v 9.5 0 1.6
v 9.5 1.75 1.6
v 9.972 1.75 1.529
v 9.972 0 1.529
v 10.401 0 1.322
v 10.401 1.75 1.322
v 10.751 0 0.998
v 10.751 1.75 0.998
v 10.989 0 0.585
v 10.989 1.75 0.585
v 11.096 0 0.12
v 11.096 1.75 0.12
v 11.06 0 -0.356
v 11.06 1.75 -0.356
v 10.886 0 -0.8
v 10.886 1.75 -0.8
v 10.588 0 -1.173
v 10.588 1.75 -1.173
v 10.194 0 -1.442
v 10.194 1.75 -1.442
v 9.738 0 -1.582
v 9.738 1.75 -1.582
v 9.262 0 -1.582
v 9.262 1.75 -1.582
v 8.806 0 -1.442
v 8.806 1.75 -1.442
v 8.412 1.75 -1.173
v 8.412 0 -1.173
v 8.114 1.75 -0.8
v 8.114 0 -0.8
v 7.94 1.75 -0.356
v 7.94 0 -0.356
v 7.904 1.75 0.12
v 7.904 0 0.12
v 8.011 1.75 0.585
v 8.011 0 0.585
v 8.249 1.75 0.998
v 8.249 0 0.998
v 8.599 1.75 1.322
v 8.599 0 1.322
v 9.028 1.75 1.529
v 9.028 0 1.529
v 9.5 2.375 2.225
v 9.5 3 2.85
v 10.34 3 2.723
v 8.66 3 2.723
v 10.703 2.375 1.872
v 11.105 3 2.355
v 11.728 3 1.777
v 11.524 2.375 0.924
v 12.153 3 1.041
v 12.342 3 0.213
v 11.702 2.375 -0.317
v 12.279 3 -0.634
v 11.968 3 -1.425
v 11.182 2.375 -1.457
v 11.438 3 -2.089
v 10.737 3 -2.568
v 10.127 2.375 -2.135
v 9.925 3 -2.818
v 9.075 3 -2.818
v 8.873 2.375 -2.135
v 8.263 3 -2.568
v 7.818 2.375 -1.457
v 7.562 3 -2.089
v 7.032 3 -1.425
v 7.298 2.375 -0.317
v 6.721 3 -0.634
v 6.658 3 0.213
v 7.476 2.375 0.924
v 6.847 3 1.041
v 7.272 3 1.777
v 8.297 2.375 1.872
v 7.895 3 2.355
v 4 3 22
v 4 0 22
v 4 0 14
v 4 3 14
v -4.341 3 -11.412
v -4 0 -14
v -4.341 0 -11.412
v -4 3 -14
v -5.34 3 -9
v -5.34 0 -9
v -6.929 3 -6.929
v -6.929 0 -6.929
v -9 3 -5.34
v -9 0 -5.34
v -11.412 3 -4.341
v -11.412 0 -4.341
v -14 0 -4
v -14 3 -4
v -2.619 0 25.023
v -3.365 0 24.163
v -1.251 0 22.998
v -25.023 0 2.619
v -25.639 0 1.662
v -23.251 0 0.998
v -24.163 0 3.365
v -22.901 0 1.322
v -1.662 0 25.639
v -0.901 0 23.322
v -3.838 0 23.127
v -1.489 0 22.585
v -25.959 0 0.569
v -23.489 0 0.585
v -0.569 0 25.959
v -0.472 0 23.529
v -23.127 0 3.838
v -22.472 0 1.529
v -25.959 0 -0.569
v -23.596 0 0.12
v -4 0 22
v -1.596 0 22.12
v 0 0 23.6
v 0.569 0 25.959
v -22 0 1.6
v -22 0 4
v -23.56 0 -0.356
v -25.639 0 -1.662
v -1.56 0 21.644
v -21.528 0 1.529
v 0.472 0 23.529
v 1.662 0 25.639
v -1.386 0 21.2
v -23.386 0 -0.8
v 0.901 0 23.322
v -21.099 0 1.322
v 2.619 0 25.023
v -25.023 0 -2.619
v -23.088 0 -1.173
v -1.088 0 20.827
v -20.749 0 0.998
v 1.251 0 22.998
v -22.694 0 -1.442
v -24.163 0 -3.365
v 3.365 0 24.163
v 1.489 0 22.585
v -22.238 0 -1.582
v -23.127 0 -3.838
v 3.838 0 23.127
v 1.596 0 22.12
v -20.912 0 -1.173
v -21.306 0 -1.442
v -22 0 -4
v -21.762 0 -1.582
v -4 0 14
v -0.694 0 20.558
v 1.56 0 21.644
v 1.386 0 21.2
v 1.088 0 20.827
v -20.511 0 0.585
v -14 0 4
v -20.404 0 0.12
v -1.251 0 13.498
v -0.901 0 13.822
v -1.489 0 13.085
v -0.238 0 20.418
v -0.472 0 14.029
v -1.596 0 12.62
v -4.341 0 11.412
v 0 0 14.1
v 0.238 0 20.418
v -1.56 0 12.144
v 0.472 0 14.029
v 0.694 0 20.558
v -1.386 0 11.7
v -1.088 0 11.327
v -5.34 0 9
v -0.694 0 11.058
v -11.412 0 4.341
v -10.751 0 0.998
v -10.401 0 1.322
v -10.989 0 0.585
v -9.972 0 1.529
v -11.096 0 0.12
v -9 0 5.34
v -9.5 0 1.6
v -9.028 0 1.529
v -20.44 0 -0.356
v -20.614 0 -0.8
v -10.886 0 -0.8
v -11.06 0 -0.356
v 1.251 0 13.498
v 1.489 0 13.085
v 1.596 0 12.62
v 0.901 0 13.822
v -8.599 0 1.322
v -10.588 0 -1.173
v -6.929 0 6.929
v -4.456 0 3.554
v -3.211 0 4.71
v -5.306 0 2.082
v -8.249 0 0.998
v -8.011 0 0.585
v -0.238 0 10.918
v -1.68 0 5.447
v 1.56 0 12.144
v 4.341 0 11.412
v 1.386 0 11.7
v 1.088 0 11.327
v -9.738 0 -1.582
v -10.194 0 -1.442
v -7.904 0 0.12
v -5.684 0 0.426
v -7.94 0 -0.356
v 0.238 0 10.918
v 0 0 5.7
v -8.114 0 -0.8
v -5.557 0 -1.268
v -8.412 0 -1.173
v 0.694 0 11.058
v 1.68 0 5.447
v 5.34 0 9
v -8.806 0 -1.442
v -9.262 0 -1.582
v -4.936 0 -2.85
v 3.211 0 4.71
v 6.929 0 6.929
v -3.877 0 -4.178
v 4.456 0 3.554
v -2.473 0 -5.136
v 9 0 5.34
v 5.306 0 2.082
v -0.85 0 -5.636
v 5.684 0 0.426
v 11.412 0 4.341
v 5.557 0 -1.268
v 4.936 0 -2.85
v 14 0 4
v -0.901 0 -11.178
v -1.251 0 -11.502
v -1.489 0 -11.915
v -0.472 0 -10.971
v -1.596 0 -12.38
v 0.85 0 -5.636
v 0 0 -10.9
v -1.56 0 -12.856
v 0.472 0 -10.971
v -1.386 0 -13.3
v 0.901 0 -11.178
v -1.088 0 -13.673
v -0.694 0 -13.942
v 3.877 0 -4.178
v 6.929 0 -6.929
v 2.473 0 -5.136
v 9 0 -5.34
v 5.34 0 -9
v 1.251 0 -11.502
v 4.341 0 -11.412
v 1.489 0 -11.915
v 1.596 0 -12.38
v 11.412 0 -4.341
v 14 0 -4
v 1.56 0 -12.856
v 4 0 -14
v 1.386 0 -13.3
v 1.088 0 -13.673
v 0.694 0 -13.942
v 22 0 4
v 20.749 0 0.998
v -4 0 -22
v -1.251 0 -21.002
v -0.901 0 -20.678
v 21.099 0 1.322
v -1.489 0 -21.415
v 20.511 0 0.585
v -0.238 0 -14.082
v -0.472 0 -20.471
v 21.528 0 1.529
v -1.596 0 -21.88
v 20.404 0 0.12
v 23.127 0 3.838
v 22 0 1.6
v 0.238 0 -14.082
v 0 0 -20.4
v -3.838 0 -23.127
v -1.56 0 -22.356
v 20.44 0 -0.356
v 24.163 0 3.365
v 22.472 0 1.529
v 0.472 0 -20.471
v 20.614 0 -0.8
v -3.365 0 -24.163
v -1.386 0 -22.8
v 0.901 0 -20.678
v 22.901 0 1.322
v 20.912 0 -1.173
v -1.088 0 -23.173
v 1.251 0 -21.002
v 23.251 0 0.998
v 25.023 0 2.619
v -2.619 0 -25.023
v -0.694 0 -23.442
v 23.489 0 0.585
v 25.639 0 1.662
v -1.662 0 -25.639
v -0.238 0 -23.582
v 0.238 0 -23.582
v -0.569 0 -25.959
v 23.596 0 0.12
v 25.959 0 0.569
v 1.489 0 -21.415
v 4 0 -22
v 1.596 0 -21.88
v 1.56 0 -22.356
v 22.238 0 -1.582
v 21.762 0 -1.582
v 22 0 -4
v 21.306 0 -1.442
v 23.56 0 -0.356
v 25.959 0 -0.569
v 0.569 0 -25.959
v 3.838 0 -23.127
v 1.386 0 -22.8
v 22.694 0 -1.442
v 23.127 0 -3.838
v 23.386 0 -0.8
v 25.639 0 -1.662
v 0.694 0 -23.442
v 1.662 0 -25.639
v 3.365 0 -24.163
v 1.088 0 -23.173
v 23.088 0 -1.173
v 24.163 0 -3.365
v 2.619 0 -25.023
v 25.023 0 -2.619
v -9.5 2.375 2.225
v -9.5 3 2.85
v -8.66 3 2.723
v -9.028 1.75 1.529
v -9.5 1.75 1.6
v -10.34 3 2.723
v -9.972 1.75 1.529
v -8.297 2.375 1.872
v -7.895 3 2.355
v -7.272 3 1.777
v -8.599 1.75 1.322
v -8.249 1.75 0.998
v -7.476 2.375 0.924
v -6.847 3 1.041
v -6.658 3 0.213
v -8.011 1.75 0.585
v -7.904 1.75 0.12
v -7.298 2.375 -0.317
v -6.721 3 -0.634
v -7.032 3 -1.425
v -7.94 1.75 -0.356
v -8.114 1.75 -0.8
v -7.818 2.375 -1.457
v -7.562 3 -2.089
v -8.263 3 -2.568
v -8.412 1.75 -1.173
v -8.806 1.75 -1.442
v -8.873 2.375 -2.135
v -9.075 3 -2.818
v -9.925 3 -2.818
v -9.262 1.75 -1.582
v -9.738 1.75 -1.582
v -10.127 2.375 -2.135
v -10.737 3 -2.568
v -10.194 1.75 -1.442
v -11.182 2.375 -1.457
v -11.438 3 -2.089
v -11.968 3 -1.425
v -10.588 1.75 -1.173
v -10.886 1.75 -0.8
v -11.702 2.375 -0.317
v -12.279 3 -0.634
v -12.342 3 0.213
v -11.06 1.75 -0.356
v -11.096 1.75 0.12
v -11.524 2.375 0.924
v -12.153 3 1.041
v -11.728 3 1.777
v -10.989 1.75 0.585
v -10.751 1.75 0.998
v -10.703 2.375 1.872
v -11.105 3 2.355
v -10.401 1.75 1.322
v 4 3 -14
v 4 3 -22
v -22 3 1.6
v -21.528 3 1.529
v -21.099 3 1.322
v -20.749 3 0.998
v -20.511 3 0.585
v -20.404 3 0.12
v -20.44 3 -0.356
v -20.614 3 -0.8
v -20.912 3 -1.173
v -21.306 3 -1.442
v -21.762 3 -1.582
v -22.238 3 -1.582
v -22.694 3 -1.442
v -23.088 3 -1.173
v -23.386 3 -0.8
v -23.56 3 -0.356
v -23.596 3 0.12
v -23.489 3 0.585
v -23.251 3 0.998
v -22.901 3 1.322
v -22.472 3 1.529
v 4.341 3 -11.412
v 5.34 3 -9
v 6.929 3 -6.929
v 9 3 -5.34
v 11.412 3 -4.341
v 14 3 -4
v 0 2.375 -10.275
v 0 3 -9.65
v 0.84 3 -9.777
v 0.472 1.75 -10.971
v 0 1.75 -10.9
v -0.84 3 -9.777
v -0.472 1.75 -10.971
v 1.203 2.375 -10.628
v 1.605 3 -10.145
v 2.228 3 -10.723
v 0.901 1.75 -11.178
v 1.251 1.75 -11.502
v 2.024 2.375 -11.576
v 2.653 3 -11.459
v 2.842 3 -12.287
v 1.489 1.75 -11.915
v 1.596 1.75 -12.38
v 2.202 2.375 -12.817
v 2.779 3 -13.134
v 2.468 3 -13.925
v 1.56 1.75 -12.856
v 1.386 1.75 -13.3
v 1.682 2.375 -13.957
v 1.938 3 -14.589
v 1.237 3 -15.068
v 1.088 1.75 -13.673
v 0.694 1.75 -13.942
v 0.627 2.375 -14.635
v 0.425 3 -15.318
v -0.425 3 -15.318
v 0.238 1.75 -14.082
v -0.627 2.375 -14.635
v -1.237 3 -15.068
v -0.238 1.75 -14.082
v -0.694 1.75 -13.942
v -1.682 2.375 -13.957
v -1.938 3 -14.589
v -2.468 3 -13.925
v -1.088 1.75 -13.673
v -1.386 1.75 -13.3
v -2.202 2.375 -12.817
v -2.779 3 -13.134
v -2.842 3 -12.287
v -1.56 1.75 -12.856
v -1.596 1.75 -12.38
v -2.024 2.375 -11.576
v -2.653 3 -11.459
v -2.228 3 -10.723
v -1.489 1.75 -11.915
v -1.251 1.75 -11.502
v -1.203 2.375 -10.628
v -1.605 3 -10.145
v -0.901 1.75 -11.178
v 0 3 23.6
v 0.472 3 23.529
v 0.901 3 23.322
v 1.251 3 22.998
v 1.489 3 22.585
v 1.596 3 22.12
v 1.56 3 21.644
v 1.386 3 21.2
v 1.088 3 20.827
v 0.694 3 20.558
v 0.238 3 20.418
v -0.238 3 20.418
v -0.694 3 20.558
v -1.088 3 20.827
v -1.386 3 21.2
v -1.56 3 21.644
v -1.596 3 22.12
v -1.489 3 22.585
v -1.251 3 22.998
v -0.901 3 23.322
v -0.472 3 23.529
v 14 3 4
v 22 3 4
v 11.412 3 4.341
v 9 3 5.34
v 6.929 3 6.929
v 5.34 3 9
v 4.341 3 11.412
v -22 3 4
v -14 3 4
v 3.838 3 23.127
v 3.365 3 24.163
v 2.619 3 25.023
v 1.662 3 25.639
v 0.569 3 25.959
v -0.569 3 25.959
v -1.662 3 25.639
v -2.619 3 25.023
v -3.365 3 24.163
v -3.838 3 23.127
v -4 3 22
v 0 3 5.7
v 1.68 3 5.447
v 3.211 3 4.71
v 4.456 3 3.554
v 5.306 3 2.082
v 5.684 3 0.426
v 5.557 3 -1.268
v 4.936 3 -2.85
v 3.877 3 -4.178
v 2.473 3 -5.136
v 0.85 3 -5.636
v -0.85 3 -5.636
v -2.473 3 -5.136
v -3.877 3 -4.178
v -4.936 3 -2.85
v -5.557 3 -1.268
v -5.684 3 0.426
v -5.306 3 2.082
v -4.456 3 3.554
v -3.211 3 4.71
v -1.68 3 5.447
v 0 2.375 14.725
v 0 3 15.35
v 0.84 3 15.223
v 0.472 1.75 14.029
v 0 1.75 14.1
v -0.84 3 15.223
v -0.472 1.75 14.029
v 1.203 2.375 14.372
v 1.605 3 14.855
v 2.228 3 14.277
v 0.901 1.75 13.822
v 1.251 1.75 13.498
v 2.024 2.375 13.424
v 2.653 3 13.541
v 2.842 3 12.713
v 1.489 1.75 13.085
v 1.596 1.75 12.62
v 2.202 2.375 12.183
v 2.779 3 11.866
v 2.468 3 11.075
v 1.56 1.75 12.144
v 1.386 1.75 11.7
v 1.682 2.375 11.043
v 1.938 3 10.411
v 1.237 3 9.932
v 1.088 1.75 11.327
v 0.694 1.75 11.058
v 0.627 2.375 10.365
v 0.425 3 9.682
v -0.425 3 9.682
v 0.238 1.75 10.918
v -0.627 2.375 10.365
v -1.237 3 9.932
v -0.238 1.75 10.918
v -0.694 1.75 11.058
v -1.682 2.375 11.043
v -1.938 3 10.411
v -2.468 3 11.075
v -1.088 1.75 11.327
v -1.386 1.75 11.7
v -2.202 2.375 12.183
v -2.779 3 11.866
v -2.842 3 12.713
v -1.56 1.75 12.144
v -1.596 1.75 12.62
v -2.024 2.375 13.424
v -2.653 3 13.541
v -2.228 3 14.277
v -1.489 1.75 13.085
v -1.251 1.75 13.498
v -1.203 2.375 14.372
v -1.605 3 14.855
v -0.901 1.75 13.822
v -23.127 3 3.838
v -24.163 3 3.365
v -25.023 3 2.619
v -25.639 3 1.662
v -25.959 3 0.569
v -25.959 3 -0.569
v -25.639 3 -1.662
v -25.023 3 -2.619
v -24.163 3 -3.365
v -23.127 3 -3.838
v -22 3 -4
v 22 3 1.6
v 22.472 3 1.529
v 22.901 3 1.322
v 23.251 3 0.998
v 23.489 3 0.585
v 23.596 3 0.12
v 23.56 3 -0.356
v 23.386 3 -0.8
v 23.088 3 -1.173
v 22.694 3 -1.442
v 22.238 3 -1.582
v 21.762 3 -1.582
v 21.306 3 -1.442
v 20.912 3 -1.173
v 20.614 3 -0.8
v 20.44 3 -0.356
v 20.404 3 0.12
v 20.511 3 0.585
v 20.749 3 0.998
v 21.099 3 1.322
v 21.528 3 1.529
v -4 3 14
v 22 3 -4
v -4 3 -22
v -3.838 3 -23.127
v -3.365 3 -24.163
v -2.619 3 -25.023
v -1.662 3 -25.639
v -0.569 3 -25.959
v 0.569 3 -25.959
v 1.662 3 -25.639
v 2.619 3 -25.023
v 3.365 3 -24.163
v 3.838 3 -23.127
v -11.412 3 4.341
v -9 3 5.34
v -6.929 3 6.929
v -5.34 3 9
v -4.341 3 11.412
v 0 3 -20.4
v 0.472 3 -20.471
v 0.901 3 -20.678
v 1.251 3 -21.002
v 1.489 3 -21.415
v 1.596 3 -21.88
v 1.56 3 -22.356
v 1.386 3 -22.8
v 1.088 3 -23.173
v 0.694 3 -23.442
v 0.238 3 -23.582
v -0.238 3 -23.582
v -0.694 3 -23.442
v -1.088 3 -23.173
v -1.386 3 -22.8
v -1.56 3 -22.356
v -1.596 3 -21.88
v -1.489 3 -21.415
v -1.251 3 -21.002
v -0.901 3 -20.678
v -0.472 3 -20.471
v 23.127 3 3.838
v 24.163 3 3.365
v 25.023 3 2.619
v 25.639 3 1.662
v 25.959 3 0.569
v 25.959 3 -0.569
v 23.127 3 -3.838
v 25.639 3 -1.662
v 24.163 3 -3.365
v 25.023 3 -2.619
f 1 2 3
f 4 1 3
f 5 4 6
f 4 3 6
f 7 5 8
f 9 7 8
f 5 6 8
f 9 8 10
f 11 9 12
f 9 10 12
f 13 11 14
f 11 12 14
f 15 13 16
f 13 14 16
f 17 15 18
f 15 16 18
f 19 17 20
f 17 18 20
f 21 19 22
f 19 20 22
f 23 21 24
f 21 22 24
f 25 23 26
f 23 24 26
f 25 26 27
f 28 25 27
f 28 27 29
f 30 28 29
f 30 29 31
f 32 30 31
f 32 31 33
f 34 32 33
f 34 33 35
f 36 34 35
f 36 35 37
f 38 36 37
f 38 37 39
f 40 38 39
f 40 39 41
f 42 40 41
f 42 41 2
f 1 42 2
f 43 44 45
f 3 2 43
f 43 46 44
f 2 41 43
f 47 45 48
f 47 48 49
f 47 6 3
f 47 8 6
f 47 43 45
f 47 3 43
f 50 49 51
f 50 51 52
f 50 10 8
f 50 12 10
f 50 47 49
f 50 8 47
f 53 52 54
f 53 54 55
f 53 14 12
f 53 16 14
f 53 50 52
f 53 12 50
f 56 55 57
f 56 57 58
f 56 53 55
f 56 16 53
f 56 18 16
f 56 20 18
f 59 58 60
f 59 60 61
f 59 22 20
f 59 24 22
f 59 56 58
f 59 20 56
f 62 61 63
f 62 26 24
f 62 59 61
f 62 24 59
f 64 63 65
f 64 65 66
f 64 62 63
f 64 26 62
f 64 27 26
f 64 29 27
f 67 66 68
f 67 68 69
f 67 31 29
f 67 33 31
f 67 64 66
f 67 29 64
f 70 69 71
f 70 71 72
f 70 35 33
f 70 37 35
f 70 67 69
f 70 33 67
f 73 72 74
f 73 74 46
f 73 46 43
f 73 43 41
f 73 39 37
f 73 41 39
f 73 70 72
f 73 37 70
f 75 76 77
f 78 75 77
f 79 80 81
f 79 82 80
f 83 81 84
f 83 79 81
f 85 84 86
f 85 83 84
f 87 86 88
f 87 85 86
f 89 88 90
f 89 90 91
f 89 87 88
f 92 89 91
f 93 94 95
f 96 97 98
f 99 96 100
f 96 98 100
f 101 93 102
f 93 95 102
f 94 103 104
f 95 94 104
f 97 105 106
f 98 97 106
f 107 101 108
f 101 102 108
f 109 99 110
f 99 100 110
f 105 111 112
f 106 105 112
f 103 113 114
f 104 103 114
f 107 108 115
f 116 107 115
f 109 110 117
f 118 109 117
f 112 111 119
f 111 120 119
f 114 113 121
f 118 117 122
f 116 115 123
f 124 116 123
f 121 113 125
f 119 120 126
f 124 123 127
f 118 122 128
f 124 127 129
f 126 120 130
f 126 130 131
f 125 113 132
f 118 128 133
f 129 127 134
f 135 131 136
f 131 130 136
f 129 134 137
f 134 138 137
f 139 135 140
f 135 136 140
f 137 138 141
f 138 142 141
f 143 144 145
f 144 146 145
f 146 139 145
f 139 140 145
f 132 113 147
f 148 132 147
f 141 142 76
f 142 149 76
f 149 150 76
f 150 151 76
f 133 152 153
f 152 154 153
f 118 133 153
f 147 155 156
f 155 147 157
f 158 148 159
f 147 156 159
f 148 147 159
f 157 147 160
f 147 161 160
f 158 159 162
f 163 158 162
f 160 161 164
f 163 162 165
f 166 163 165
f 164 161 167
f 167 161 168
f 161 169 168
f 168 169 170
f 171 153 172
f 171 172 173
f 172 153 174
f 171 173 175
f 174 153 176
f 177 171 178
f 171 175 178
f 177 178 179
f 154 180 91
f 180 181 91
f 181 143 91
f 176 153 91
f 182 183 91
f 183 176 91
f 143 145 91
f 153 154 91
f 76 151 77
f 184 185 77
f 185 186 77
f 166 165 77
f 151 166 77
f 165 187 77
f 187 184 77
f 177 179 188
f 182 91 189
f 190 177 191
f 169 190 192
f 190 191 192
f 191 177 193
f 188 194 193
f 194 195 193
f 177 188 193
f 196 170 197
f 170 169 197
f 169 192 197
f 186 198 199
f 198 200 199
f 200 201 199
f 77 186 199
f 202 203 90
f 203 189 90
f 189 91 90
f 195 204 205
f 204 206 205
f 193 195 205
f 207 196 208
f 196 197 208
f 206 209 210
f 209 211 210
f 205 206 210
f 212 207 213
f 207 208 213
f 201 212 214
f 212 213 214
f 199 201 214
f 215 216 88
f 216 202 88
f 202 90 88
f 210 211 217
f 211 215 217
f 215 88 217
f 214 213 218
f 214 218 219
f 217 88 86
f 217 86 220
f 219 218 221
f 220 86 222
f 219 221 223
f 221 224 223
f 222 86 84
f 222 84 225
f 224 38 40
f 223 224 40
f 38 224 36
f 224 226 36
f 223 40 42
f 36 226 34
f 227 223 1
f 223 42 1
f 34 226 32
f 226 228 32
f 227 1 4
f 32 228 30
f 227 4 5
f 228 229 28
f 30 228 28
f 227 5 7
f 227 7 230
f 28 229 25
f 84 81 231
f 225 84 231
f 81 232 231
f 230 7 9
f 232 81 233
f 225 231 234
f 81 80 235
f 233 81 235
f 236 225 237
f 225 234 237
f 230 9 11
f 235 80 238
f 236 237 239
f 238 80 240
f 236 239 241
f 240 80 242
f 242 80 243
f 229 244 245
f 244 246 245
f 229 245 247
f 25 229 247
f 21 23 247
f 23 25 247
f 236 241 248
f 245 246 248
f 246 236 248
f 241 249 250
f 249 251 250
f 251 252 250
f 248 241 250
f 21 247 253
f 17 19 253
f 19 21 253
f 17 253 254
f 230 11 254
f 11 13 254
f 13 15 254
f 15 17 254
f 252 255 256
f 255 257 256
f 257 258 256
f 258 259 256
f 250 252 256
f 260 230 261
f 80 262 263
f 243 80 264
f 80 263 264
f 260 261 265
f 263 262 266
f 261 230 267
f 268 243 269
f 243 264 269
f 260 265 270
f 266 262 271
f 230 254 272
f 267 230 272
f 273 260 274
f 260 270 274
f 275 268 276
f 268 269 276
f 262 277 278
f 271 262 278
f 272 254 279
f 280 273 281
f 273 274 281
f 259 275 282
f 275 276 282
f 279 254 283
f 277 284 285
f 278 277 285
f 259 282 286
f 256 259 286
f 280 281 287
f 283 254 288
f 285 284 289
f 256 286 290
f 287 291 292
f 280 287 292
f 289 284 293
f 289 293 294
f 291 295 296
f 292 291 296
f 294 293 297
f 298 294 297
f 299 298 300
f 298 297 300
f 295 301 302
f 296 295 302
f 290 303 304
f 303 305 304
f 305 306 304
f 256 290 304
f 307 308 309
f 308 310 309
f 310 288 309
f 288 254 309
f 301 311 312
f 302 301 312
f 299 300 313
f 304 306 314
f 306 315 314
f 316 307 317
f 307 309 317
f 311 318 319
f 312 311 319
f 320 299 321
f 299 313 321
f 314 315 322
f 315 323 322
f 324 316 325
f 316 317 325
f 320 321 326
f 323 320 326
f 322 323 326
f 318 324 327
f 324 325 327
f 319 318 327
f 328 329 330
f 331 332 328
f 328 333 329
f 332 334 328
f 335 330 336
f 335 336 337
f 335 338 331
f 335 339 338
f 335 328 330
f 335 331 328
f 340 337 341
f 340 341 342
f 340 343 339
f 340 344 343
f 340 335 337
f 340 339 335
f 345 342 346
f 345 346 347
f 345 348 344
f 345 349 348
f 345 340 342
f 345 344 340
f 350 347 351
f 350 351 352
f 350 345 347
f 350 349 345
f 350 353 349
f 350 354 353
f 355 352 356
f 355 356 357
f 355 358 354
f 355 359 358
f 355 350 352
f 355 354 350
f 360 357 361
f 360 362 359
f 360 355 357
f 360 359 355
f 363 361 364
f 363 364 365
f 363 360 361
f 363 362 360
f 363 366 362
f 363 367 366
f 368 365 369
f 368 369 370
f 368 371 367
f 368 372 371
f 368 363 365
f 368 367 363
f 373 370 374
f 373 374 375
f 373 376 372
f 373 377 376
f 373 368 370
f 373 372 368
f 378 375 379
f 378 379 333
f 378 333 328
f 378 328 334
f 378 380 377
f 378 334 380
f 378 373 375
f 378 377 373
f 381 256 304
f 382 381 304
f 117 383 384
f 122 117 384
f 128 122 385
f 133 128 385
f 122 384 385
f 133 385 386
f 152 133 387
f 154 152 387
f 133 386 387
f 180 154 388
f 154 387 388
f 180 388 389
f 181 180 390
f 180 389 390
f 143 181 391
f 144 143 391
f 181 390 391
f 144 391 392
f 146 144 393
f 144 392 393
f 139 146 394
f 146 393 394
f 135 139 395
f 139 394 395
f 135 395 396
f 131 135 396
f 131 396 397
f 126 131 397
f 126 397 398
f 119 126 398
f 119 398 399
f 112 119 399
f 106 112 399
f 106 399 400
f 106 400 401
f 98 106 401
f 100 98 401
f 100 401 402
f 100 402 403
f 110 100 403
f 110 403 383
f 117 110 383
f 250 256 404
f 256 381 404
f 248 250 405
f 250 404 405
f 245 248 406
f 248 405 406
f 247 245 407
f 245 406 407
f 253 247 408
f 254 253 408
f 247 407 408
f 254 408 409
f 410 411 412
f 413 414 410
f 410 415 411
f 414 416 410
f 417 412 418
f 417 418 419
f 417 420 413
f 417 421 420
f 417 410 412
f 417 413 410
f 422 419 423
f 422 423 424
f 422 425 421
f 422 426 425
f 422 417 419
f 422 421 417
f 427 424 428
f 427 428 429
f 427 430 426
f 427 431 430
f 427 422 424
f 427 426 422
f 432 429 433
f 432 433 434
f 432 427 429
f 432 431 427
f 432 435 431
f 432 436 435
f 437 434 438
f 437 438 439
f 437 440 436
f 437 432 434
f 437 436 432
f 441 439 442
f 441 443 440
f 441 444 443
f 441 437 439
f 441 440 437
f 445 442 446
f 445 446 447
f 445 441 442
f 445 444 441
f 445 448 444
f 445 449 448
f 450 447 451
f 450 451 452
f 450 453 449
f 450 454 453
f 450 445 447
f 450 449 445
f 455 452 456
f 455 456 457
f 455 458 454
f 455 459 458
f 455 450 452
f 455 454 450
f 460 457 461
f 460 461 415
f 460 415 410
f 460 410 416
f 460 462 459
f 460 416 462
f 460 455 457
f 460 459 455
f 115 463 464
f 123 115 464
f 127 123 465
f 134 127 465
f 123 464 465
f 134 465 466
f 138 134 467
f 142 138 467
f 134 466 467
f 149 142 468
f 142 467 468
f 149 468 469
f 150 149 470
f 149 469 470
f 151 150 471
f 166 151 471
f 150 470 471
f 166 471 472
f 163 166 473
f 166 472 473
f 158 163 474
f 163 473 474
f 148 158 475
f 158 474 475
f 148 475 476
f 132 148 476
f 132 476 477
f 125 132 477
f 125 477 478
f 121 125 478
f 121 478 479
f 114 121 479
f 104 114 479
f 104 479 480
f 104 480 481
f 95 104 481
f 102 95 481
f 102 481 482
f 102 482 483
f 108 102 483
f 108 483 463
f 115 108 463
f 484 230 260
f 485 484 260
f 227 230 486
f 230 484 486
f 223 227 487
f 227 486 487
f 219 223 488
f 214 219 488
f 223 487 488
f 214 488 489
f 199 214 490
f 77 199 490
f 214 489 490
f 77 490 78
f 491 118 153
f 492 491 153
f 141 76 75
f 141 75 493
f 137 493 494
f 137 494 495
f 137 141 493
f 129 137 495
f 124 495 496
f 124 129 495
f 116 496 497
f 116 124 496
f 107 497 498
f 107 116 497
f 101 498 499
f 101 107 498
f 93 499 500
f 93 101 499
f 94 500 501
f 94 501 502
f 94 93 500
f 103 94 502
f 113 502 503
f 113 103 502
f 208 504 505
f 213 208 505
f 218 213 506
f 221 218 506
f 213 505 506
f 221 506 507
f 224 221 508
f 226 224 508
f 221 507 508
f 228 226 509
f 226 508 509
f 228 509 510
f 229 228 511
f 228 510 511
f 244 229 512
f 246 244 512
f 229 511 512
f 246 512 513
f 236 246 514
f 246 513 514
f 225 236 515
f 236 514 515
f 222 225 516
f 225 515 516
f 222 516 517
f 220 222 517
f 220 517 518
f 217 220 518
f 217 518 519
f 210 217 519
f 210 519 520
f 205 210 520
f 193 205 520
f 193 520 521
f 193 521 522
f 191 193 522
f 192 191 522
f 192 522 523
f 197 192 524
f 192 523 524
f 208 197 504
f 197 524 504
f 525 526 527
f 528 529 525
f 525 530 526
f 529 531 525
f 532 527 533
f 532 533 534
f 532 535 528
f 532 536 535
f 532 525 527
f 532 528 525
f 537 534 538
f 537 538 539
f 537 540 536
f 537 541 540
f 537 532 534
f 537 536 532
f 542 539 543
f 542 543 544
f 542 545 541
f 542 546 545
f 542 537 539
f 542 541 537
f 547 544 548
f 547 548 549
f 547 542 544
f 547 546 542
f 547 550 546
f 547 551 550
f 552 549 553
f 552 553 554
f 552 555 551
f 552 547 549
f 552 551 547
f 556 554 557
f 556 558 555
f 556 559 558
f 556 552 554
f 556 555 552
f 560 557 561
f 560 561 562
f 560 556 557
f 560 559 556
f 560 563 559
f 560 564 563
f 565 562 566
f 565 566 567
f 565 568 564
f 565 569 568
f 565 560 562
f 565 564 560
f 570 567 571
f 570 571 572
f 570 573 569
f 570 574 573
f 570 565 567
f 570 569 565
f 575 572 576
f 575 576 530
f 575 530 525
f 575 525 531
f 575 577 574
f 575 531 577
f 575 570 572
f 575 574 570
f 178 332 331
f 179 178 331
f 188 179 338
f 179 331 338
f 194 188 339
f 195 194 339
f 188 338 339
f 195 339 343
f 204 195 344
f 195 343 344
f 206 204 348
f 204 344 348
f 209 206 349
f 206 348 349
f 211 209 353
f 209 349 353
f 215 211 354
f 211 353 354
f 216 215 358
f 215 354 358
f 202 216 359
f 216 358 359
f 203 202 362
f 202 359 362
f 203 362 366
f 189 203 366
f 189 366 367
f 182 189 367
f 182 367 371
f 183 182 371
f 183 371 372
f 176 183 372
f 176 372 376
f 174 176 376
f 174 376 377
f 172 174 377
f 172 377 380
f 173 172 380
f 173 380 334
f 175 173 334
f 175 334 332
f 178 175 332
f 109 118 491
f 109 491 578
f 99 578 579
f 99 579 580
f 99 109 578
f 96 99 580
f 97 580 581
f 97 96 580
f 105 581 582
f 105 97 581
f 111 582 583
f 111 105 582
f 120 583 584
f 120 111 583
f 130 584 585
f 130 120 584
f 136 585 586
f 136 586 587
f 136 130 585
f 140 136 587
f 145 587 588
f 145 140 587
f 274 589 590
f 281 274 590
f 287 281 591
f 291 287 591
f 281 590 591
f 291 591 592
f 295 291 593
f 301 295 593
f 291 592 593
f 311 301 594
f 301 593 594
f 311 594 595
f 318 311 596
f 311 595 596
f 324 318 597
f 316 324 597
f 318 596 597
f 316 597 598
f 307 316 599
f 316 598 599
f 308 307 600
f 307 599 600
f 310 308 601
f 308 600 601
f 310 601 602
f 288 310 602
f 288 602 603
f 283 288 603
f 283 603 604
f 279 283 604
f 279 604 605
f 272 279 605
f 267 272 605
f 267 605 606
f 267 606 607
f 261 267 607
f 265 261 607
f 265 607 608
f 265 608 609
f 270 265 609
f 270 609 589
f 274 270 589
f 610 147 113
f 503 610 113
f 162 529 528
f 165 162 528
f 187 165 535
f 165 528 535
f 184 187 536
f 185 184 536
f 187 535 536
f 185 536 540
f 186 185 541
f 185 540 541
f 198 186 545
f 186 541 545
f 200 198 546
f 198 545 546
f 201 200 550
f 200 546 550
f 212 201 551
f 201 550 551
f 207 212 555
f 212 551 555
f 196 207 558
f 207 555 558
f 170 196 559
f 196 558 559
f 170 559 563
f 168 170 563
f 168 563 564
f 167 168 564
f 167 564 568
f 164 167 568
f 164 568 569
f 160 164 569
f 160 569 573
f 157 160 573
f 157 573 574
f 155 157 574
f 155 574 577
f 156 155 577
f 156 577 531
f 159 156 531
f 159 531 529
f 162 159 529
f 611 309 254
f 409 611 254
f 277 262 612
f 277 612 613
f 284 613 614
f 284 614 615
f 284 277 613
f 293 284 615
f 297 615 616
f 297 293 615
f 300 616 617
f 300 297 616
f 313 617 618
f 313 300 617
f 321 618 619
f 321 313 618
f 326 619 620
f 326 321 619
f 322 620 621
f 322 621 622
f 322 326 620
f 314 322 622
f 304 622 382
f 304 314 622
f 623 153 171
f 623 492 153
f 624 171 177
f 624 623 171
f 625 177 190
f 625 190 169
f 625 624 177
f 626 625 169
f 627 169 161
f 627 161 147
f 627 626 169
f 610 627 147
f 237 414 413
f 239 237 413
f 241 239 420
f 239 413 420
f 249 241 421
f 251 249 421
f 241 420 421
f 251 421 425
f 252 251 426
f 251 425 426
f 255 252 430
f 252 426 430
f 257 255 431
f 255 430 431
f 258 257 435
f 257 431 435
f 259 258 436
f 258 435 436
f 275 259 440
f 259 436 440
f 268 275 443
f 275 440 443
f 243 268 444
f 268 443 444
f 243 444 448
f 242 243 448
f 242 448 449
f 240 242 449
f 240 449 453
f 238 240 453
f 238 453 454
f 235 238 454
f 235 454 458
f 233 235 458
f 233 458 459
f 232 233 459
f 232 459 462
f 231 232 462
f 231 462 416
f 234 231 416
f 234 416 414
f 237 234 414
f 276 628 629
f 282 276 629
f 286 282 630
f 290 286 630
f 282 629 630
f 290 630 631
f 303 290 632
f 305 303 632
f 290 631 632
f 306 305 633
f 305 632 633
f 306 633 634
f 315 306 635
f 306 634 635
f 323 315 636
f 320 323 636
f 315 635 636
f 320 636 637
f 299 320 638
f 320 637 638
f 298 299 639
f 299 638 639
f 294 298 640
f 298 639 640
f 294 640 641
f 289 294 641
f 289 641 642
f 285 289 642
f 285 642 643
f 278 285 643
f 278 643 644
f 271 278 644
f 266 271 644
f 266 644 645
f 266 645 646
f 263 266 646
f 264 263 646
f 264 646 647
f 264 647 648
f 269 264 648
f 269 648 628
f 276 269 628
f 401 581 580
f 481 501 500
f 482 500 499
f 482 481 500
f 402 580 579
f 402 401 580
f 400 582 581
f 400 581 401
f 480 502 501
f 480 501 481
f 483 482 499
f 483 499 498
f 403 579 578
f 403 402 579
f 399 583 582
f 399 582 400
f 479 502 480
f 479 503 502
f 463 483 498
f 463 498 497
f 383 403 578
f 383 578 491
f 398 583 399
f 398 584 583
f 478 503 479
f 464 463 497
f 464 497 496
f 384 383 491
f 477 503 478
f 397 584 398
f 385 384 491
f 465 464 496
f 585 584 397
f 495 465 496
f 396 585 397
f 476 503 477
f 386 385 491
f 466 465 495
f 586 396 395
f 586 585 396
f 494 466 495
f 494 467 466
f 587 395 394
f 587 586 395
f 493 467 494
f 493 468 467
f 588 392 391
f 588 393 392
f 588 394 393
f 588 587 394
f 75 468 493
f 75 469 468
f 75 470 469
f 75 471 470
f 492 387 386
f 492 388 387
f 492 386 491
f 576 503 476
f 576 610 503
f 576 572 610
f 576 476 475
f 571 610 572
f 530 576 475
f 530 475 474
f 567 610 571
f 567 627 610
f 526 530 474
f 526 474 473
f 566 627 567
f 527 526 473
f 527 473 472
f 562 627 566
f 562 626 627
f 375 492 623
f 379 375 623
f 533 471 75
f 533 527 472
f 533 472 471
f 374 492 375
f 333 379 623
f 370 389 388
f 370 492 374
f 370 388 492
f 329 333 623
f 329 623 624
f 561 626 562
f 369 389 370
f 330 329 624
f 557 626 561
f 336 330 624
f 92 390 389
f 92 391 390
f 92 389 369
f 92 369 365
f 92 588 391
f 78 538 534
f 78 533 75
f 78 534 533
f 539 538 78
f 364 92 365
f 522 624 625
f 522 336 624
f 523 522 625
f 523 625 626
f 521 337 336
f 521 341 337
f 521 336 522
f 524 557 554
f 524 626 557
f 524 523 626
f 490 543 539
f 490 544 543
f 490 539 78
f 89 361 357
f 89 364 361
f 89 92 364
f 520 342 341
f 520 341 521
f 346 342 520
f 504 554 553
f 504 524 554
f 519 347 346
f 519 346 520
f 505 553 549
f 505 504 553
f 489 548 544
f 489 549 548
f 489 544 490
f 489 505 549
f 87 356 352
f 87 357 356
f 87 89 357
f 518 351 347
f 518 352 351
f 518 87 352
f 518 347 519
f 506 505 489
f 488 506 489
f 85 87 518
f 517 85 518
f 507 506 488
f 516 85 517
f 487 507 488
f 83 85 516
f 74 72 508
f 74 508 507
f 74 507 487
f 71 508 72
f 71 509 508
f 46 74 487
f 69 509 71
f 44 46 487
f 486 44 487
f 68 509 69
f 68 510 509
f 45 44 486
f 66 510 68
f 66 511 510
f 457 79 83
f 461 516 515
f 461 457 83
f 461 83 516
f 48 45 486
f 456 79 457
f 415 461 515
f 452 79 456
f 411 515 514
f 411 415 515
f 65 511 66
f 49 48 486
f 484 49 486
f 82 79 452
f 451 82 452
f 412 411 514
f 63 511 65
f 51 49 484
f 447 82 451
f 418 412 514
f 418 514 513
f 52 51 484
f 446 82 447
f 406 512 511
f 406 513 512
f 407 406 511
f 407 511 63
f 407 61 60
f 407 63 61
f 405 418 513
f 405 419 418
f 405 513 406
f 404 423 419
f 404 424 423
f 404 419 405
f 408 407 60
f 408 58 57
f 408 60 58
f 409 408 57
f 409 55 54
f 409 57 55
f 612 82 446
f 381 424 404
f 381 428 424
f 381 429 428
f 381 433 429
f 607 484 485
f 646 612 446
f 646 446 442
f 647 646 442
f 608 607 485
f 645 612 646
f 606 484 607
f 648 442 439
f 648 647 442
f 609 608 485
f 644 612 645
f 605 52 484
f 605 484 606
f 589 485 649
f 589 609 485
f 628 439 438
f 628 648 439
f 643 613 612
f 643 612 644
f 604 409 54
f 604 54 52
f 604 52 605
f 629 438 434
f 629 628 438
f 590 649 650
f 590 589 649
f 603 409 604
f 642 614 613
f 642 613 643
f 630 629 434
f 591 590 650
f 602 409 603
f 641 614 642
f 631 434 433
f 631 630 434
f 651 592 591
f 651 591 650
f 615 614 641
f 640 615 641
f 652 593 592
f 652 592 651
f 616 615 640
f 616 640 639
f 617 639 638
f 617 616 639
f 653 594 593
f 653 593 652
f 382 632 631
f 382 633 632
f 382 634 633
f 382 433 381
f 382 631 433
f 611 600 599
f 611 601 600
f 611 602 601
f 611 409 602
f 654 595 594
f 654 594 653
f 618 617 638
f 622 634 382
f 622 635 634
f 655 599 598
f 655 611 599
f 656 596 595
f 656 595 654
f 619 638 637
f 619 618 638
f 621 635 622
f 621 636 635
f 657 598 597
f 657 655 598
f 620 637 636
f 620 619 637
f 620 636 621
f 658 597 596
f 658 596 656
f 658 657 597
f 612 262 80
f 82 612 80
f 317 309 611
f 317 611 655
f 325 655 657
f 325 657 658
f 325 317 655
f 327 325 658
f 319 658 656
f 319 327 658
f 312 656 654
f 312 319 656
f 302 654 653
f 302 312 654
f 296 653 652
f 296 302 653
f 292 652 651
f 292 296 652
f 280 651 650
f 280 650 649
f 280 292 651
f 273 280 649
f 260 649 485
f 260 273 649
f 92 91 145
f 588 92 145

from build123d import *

# Parameters (mm, degrees)
BOSS_EXTRUDE1_DEPTH = 3
SKETCH2_R           = 1.6
CUT_EXTRUDE1_DEPTH  = 25
CHAMFER1_SIZE       = 1.25
FILLET1_R           = 10
SKETCH3_R           = 5.7
CUT_EXTRUDE2_DEPTH  = 3


with BuildPart() as part:
    # Sketch1 → Boss-Extrude1 (new body)
    with BuildSketch(Plane(origin=(0, 0, 0), x_dir=(1, 0, 0), z_dir=(0, 1, 0))):
        Polygon((4, 4), (4, 22), (-4, 22), (-4, 4), (-22, 4), (-22, -4), (-4, -4), (-4, -22), (4, -22), (4, -4), (22, -4), (22, 4), align=None)
        with BuildLine():
            ThreePointArc((-4, 22), (0, 26), (4, 22))
            Line((4, 22), (-4, 22))
        make_face()
        with BuildLine():
            ThreePointArc((22, 4), (26, 0), (22, -4))
            Line((22, -4), (22, 4))
        make_face()
        with BuildLine():
            Line((-22, 4), (-22, -4))
            ThreePointArc((-22, -4), (-26, 0), (-22, 4))
        make_face()
        with BuildLine():
            ThreePointArc((4, -22), (0, -26), (-4, -22))
            Line((-4, -22), (4, -22))
        make_face()
    extrude(amount=BOSS_EXTRUDE1_DEPTH)

    # Sketch2 → Cut-Extrude1 (cut)
    with BuildSketch(Plane(origin=(0, 3, 0), x_dir=(1, 0, 0), z_dir=(0, 1, 0))):
        with Locations(Location((-22, 0, 0), (0, 0, 270))):
            Circle(SKETCH2_R)
        with Locations(Location((0, 22, 0), (0, 0, 270))):
            Circle(SKETCH2_R)
        with Locations(Location((0, -22, 0), (0, 0, 270))):
            Circle(SKETCH2_R)
        with Locations(Location((22, 0, 0), (0, 0, 270))):
            Circle(SKETCH2_R)
        with Locations(Location((0, 12.5, 0), (0, 0, 270))):
            Circle(SKETCH2_R)
        with Locations(Location((-9.5, 0, 0), (0, 0, 270))):
            Circle(SKETCH2_R)
        with Locations(Location((0, -12.5, 0), (0, 0, 270))):
            Circle(SKETCH2_R)
        with Locations(Location((9.5, 0, 0), (0, 0, 270))):
            Circle(SKETCH2_R)
    extrude(amount=-CUT_EXTRUDE1_DEPTH, mode=Mode.SUBTRACT)

    # Chamfer1
    chamfer1_edges = [part.edges().sort_by_distance(p)[0] for p in [
        (9.5, 3, -1.6),
        (0, 3, 10.9),
        (-9.5, 3, -1.6),
        (0, 3, -14.1),
    ]]
    chamfer(chamfer1_edges, length=CHAMFER1_SIZE)

    # Fillet1
    fillet1_edges = [part.edges().sort_by_distance(p)[0] for p in [
        (4, 1.5, -4),
        (4, 1.5, 4),
        (-4, 1.5, 4),
        (-4, 1.5, -4),
    ]]
    fillet(fillet1_edges, radius=FILLET1_R)

    # Sketch3 → Cut-Extrude2 (cut)
    with BuildSketch(Plane(origin=(0, 3, 0), x_dir=(1, 0, 0), z_dir=(0, 1, 0))):
        with Locations(Location((0, 0, 0), (0, 0, 270))):
            Circle(SKETCH3_R)
    extrude(amount=-CUT_EXTRUDE2_DEPTH, mode=Mode.SUBTRACT)


solid = part.part
